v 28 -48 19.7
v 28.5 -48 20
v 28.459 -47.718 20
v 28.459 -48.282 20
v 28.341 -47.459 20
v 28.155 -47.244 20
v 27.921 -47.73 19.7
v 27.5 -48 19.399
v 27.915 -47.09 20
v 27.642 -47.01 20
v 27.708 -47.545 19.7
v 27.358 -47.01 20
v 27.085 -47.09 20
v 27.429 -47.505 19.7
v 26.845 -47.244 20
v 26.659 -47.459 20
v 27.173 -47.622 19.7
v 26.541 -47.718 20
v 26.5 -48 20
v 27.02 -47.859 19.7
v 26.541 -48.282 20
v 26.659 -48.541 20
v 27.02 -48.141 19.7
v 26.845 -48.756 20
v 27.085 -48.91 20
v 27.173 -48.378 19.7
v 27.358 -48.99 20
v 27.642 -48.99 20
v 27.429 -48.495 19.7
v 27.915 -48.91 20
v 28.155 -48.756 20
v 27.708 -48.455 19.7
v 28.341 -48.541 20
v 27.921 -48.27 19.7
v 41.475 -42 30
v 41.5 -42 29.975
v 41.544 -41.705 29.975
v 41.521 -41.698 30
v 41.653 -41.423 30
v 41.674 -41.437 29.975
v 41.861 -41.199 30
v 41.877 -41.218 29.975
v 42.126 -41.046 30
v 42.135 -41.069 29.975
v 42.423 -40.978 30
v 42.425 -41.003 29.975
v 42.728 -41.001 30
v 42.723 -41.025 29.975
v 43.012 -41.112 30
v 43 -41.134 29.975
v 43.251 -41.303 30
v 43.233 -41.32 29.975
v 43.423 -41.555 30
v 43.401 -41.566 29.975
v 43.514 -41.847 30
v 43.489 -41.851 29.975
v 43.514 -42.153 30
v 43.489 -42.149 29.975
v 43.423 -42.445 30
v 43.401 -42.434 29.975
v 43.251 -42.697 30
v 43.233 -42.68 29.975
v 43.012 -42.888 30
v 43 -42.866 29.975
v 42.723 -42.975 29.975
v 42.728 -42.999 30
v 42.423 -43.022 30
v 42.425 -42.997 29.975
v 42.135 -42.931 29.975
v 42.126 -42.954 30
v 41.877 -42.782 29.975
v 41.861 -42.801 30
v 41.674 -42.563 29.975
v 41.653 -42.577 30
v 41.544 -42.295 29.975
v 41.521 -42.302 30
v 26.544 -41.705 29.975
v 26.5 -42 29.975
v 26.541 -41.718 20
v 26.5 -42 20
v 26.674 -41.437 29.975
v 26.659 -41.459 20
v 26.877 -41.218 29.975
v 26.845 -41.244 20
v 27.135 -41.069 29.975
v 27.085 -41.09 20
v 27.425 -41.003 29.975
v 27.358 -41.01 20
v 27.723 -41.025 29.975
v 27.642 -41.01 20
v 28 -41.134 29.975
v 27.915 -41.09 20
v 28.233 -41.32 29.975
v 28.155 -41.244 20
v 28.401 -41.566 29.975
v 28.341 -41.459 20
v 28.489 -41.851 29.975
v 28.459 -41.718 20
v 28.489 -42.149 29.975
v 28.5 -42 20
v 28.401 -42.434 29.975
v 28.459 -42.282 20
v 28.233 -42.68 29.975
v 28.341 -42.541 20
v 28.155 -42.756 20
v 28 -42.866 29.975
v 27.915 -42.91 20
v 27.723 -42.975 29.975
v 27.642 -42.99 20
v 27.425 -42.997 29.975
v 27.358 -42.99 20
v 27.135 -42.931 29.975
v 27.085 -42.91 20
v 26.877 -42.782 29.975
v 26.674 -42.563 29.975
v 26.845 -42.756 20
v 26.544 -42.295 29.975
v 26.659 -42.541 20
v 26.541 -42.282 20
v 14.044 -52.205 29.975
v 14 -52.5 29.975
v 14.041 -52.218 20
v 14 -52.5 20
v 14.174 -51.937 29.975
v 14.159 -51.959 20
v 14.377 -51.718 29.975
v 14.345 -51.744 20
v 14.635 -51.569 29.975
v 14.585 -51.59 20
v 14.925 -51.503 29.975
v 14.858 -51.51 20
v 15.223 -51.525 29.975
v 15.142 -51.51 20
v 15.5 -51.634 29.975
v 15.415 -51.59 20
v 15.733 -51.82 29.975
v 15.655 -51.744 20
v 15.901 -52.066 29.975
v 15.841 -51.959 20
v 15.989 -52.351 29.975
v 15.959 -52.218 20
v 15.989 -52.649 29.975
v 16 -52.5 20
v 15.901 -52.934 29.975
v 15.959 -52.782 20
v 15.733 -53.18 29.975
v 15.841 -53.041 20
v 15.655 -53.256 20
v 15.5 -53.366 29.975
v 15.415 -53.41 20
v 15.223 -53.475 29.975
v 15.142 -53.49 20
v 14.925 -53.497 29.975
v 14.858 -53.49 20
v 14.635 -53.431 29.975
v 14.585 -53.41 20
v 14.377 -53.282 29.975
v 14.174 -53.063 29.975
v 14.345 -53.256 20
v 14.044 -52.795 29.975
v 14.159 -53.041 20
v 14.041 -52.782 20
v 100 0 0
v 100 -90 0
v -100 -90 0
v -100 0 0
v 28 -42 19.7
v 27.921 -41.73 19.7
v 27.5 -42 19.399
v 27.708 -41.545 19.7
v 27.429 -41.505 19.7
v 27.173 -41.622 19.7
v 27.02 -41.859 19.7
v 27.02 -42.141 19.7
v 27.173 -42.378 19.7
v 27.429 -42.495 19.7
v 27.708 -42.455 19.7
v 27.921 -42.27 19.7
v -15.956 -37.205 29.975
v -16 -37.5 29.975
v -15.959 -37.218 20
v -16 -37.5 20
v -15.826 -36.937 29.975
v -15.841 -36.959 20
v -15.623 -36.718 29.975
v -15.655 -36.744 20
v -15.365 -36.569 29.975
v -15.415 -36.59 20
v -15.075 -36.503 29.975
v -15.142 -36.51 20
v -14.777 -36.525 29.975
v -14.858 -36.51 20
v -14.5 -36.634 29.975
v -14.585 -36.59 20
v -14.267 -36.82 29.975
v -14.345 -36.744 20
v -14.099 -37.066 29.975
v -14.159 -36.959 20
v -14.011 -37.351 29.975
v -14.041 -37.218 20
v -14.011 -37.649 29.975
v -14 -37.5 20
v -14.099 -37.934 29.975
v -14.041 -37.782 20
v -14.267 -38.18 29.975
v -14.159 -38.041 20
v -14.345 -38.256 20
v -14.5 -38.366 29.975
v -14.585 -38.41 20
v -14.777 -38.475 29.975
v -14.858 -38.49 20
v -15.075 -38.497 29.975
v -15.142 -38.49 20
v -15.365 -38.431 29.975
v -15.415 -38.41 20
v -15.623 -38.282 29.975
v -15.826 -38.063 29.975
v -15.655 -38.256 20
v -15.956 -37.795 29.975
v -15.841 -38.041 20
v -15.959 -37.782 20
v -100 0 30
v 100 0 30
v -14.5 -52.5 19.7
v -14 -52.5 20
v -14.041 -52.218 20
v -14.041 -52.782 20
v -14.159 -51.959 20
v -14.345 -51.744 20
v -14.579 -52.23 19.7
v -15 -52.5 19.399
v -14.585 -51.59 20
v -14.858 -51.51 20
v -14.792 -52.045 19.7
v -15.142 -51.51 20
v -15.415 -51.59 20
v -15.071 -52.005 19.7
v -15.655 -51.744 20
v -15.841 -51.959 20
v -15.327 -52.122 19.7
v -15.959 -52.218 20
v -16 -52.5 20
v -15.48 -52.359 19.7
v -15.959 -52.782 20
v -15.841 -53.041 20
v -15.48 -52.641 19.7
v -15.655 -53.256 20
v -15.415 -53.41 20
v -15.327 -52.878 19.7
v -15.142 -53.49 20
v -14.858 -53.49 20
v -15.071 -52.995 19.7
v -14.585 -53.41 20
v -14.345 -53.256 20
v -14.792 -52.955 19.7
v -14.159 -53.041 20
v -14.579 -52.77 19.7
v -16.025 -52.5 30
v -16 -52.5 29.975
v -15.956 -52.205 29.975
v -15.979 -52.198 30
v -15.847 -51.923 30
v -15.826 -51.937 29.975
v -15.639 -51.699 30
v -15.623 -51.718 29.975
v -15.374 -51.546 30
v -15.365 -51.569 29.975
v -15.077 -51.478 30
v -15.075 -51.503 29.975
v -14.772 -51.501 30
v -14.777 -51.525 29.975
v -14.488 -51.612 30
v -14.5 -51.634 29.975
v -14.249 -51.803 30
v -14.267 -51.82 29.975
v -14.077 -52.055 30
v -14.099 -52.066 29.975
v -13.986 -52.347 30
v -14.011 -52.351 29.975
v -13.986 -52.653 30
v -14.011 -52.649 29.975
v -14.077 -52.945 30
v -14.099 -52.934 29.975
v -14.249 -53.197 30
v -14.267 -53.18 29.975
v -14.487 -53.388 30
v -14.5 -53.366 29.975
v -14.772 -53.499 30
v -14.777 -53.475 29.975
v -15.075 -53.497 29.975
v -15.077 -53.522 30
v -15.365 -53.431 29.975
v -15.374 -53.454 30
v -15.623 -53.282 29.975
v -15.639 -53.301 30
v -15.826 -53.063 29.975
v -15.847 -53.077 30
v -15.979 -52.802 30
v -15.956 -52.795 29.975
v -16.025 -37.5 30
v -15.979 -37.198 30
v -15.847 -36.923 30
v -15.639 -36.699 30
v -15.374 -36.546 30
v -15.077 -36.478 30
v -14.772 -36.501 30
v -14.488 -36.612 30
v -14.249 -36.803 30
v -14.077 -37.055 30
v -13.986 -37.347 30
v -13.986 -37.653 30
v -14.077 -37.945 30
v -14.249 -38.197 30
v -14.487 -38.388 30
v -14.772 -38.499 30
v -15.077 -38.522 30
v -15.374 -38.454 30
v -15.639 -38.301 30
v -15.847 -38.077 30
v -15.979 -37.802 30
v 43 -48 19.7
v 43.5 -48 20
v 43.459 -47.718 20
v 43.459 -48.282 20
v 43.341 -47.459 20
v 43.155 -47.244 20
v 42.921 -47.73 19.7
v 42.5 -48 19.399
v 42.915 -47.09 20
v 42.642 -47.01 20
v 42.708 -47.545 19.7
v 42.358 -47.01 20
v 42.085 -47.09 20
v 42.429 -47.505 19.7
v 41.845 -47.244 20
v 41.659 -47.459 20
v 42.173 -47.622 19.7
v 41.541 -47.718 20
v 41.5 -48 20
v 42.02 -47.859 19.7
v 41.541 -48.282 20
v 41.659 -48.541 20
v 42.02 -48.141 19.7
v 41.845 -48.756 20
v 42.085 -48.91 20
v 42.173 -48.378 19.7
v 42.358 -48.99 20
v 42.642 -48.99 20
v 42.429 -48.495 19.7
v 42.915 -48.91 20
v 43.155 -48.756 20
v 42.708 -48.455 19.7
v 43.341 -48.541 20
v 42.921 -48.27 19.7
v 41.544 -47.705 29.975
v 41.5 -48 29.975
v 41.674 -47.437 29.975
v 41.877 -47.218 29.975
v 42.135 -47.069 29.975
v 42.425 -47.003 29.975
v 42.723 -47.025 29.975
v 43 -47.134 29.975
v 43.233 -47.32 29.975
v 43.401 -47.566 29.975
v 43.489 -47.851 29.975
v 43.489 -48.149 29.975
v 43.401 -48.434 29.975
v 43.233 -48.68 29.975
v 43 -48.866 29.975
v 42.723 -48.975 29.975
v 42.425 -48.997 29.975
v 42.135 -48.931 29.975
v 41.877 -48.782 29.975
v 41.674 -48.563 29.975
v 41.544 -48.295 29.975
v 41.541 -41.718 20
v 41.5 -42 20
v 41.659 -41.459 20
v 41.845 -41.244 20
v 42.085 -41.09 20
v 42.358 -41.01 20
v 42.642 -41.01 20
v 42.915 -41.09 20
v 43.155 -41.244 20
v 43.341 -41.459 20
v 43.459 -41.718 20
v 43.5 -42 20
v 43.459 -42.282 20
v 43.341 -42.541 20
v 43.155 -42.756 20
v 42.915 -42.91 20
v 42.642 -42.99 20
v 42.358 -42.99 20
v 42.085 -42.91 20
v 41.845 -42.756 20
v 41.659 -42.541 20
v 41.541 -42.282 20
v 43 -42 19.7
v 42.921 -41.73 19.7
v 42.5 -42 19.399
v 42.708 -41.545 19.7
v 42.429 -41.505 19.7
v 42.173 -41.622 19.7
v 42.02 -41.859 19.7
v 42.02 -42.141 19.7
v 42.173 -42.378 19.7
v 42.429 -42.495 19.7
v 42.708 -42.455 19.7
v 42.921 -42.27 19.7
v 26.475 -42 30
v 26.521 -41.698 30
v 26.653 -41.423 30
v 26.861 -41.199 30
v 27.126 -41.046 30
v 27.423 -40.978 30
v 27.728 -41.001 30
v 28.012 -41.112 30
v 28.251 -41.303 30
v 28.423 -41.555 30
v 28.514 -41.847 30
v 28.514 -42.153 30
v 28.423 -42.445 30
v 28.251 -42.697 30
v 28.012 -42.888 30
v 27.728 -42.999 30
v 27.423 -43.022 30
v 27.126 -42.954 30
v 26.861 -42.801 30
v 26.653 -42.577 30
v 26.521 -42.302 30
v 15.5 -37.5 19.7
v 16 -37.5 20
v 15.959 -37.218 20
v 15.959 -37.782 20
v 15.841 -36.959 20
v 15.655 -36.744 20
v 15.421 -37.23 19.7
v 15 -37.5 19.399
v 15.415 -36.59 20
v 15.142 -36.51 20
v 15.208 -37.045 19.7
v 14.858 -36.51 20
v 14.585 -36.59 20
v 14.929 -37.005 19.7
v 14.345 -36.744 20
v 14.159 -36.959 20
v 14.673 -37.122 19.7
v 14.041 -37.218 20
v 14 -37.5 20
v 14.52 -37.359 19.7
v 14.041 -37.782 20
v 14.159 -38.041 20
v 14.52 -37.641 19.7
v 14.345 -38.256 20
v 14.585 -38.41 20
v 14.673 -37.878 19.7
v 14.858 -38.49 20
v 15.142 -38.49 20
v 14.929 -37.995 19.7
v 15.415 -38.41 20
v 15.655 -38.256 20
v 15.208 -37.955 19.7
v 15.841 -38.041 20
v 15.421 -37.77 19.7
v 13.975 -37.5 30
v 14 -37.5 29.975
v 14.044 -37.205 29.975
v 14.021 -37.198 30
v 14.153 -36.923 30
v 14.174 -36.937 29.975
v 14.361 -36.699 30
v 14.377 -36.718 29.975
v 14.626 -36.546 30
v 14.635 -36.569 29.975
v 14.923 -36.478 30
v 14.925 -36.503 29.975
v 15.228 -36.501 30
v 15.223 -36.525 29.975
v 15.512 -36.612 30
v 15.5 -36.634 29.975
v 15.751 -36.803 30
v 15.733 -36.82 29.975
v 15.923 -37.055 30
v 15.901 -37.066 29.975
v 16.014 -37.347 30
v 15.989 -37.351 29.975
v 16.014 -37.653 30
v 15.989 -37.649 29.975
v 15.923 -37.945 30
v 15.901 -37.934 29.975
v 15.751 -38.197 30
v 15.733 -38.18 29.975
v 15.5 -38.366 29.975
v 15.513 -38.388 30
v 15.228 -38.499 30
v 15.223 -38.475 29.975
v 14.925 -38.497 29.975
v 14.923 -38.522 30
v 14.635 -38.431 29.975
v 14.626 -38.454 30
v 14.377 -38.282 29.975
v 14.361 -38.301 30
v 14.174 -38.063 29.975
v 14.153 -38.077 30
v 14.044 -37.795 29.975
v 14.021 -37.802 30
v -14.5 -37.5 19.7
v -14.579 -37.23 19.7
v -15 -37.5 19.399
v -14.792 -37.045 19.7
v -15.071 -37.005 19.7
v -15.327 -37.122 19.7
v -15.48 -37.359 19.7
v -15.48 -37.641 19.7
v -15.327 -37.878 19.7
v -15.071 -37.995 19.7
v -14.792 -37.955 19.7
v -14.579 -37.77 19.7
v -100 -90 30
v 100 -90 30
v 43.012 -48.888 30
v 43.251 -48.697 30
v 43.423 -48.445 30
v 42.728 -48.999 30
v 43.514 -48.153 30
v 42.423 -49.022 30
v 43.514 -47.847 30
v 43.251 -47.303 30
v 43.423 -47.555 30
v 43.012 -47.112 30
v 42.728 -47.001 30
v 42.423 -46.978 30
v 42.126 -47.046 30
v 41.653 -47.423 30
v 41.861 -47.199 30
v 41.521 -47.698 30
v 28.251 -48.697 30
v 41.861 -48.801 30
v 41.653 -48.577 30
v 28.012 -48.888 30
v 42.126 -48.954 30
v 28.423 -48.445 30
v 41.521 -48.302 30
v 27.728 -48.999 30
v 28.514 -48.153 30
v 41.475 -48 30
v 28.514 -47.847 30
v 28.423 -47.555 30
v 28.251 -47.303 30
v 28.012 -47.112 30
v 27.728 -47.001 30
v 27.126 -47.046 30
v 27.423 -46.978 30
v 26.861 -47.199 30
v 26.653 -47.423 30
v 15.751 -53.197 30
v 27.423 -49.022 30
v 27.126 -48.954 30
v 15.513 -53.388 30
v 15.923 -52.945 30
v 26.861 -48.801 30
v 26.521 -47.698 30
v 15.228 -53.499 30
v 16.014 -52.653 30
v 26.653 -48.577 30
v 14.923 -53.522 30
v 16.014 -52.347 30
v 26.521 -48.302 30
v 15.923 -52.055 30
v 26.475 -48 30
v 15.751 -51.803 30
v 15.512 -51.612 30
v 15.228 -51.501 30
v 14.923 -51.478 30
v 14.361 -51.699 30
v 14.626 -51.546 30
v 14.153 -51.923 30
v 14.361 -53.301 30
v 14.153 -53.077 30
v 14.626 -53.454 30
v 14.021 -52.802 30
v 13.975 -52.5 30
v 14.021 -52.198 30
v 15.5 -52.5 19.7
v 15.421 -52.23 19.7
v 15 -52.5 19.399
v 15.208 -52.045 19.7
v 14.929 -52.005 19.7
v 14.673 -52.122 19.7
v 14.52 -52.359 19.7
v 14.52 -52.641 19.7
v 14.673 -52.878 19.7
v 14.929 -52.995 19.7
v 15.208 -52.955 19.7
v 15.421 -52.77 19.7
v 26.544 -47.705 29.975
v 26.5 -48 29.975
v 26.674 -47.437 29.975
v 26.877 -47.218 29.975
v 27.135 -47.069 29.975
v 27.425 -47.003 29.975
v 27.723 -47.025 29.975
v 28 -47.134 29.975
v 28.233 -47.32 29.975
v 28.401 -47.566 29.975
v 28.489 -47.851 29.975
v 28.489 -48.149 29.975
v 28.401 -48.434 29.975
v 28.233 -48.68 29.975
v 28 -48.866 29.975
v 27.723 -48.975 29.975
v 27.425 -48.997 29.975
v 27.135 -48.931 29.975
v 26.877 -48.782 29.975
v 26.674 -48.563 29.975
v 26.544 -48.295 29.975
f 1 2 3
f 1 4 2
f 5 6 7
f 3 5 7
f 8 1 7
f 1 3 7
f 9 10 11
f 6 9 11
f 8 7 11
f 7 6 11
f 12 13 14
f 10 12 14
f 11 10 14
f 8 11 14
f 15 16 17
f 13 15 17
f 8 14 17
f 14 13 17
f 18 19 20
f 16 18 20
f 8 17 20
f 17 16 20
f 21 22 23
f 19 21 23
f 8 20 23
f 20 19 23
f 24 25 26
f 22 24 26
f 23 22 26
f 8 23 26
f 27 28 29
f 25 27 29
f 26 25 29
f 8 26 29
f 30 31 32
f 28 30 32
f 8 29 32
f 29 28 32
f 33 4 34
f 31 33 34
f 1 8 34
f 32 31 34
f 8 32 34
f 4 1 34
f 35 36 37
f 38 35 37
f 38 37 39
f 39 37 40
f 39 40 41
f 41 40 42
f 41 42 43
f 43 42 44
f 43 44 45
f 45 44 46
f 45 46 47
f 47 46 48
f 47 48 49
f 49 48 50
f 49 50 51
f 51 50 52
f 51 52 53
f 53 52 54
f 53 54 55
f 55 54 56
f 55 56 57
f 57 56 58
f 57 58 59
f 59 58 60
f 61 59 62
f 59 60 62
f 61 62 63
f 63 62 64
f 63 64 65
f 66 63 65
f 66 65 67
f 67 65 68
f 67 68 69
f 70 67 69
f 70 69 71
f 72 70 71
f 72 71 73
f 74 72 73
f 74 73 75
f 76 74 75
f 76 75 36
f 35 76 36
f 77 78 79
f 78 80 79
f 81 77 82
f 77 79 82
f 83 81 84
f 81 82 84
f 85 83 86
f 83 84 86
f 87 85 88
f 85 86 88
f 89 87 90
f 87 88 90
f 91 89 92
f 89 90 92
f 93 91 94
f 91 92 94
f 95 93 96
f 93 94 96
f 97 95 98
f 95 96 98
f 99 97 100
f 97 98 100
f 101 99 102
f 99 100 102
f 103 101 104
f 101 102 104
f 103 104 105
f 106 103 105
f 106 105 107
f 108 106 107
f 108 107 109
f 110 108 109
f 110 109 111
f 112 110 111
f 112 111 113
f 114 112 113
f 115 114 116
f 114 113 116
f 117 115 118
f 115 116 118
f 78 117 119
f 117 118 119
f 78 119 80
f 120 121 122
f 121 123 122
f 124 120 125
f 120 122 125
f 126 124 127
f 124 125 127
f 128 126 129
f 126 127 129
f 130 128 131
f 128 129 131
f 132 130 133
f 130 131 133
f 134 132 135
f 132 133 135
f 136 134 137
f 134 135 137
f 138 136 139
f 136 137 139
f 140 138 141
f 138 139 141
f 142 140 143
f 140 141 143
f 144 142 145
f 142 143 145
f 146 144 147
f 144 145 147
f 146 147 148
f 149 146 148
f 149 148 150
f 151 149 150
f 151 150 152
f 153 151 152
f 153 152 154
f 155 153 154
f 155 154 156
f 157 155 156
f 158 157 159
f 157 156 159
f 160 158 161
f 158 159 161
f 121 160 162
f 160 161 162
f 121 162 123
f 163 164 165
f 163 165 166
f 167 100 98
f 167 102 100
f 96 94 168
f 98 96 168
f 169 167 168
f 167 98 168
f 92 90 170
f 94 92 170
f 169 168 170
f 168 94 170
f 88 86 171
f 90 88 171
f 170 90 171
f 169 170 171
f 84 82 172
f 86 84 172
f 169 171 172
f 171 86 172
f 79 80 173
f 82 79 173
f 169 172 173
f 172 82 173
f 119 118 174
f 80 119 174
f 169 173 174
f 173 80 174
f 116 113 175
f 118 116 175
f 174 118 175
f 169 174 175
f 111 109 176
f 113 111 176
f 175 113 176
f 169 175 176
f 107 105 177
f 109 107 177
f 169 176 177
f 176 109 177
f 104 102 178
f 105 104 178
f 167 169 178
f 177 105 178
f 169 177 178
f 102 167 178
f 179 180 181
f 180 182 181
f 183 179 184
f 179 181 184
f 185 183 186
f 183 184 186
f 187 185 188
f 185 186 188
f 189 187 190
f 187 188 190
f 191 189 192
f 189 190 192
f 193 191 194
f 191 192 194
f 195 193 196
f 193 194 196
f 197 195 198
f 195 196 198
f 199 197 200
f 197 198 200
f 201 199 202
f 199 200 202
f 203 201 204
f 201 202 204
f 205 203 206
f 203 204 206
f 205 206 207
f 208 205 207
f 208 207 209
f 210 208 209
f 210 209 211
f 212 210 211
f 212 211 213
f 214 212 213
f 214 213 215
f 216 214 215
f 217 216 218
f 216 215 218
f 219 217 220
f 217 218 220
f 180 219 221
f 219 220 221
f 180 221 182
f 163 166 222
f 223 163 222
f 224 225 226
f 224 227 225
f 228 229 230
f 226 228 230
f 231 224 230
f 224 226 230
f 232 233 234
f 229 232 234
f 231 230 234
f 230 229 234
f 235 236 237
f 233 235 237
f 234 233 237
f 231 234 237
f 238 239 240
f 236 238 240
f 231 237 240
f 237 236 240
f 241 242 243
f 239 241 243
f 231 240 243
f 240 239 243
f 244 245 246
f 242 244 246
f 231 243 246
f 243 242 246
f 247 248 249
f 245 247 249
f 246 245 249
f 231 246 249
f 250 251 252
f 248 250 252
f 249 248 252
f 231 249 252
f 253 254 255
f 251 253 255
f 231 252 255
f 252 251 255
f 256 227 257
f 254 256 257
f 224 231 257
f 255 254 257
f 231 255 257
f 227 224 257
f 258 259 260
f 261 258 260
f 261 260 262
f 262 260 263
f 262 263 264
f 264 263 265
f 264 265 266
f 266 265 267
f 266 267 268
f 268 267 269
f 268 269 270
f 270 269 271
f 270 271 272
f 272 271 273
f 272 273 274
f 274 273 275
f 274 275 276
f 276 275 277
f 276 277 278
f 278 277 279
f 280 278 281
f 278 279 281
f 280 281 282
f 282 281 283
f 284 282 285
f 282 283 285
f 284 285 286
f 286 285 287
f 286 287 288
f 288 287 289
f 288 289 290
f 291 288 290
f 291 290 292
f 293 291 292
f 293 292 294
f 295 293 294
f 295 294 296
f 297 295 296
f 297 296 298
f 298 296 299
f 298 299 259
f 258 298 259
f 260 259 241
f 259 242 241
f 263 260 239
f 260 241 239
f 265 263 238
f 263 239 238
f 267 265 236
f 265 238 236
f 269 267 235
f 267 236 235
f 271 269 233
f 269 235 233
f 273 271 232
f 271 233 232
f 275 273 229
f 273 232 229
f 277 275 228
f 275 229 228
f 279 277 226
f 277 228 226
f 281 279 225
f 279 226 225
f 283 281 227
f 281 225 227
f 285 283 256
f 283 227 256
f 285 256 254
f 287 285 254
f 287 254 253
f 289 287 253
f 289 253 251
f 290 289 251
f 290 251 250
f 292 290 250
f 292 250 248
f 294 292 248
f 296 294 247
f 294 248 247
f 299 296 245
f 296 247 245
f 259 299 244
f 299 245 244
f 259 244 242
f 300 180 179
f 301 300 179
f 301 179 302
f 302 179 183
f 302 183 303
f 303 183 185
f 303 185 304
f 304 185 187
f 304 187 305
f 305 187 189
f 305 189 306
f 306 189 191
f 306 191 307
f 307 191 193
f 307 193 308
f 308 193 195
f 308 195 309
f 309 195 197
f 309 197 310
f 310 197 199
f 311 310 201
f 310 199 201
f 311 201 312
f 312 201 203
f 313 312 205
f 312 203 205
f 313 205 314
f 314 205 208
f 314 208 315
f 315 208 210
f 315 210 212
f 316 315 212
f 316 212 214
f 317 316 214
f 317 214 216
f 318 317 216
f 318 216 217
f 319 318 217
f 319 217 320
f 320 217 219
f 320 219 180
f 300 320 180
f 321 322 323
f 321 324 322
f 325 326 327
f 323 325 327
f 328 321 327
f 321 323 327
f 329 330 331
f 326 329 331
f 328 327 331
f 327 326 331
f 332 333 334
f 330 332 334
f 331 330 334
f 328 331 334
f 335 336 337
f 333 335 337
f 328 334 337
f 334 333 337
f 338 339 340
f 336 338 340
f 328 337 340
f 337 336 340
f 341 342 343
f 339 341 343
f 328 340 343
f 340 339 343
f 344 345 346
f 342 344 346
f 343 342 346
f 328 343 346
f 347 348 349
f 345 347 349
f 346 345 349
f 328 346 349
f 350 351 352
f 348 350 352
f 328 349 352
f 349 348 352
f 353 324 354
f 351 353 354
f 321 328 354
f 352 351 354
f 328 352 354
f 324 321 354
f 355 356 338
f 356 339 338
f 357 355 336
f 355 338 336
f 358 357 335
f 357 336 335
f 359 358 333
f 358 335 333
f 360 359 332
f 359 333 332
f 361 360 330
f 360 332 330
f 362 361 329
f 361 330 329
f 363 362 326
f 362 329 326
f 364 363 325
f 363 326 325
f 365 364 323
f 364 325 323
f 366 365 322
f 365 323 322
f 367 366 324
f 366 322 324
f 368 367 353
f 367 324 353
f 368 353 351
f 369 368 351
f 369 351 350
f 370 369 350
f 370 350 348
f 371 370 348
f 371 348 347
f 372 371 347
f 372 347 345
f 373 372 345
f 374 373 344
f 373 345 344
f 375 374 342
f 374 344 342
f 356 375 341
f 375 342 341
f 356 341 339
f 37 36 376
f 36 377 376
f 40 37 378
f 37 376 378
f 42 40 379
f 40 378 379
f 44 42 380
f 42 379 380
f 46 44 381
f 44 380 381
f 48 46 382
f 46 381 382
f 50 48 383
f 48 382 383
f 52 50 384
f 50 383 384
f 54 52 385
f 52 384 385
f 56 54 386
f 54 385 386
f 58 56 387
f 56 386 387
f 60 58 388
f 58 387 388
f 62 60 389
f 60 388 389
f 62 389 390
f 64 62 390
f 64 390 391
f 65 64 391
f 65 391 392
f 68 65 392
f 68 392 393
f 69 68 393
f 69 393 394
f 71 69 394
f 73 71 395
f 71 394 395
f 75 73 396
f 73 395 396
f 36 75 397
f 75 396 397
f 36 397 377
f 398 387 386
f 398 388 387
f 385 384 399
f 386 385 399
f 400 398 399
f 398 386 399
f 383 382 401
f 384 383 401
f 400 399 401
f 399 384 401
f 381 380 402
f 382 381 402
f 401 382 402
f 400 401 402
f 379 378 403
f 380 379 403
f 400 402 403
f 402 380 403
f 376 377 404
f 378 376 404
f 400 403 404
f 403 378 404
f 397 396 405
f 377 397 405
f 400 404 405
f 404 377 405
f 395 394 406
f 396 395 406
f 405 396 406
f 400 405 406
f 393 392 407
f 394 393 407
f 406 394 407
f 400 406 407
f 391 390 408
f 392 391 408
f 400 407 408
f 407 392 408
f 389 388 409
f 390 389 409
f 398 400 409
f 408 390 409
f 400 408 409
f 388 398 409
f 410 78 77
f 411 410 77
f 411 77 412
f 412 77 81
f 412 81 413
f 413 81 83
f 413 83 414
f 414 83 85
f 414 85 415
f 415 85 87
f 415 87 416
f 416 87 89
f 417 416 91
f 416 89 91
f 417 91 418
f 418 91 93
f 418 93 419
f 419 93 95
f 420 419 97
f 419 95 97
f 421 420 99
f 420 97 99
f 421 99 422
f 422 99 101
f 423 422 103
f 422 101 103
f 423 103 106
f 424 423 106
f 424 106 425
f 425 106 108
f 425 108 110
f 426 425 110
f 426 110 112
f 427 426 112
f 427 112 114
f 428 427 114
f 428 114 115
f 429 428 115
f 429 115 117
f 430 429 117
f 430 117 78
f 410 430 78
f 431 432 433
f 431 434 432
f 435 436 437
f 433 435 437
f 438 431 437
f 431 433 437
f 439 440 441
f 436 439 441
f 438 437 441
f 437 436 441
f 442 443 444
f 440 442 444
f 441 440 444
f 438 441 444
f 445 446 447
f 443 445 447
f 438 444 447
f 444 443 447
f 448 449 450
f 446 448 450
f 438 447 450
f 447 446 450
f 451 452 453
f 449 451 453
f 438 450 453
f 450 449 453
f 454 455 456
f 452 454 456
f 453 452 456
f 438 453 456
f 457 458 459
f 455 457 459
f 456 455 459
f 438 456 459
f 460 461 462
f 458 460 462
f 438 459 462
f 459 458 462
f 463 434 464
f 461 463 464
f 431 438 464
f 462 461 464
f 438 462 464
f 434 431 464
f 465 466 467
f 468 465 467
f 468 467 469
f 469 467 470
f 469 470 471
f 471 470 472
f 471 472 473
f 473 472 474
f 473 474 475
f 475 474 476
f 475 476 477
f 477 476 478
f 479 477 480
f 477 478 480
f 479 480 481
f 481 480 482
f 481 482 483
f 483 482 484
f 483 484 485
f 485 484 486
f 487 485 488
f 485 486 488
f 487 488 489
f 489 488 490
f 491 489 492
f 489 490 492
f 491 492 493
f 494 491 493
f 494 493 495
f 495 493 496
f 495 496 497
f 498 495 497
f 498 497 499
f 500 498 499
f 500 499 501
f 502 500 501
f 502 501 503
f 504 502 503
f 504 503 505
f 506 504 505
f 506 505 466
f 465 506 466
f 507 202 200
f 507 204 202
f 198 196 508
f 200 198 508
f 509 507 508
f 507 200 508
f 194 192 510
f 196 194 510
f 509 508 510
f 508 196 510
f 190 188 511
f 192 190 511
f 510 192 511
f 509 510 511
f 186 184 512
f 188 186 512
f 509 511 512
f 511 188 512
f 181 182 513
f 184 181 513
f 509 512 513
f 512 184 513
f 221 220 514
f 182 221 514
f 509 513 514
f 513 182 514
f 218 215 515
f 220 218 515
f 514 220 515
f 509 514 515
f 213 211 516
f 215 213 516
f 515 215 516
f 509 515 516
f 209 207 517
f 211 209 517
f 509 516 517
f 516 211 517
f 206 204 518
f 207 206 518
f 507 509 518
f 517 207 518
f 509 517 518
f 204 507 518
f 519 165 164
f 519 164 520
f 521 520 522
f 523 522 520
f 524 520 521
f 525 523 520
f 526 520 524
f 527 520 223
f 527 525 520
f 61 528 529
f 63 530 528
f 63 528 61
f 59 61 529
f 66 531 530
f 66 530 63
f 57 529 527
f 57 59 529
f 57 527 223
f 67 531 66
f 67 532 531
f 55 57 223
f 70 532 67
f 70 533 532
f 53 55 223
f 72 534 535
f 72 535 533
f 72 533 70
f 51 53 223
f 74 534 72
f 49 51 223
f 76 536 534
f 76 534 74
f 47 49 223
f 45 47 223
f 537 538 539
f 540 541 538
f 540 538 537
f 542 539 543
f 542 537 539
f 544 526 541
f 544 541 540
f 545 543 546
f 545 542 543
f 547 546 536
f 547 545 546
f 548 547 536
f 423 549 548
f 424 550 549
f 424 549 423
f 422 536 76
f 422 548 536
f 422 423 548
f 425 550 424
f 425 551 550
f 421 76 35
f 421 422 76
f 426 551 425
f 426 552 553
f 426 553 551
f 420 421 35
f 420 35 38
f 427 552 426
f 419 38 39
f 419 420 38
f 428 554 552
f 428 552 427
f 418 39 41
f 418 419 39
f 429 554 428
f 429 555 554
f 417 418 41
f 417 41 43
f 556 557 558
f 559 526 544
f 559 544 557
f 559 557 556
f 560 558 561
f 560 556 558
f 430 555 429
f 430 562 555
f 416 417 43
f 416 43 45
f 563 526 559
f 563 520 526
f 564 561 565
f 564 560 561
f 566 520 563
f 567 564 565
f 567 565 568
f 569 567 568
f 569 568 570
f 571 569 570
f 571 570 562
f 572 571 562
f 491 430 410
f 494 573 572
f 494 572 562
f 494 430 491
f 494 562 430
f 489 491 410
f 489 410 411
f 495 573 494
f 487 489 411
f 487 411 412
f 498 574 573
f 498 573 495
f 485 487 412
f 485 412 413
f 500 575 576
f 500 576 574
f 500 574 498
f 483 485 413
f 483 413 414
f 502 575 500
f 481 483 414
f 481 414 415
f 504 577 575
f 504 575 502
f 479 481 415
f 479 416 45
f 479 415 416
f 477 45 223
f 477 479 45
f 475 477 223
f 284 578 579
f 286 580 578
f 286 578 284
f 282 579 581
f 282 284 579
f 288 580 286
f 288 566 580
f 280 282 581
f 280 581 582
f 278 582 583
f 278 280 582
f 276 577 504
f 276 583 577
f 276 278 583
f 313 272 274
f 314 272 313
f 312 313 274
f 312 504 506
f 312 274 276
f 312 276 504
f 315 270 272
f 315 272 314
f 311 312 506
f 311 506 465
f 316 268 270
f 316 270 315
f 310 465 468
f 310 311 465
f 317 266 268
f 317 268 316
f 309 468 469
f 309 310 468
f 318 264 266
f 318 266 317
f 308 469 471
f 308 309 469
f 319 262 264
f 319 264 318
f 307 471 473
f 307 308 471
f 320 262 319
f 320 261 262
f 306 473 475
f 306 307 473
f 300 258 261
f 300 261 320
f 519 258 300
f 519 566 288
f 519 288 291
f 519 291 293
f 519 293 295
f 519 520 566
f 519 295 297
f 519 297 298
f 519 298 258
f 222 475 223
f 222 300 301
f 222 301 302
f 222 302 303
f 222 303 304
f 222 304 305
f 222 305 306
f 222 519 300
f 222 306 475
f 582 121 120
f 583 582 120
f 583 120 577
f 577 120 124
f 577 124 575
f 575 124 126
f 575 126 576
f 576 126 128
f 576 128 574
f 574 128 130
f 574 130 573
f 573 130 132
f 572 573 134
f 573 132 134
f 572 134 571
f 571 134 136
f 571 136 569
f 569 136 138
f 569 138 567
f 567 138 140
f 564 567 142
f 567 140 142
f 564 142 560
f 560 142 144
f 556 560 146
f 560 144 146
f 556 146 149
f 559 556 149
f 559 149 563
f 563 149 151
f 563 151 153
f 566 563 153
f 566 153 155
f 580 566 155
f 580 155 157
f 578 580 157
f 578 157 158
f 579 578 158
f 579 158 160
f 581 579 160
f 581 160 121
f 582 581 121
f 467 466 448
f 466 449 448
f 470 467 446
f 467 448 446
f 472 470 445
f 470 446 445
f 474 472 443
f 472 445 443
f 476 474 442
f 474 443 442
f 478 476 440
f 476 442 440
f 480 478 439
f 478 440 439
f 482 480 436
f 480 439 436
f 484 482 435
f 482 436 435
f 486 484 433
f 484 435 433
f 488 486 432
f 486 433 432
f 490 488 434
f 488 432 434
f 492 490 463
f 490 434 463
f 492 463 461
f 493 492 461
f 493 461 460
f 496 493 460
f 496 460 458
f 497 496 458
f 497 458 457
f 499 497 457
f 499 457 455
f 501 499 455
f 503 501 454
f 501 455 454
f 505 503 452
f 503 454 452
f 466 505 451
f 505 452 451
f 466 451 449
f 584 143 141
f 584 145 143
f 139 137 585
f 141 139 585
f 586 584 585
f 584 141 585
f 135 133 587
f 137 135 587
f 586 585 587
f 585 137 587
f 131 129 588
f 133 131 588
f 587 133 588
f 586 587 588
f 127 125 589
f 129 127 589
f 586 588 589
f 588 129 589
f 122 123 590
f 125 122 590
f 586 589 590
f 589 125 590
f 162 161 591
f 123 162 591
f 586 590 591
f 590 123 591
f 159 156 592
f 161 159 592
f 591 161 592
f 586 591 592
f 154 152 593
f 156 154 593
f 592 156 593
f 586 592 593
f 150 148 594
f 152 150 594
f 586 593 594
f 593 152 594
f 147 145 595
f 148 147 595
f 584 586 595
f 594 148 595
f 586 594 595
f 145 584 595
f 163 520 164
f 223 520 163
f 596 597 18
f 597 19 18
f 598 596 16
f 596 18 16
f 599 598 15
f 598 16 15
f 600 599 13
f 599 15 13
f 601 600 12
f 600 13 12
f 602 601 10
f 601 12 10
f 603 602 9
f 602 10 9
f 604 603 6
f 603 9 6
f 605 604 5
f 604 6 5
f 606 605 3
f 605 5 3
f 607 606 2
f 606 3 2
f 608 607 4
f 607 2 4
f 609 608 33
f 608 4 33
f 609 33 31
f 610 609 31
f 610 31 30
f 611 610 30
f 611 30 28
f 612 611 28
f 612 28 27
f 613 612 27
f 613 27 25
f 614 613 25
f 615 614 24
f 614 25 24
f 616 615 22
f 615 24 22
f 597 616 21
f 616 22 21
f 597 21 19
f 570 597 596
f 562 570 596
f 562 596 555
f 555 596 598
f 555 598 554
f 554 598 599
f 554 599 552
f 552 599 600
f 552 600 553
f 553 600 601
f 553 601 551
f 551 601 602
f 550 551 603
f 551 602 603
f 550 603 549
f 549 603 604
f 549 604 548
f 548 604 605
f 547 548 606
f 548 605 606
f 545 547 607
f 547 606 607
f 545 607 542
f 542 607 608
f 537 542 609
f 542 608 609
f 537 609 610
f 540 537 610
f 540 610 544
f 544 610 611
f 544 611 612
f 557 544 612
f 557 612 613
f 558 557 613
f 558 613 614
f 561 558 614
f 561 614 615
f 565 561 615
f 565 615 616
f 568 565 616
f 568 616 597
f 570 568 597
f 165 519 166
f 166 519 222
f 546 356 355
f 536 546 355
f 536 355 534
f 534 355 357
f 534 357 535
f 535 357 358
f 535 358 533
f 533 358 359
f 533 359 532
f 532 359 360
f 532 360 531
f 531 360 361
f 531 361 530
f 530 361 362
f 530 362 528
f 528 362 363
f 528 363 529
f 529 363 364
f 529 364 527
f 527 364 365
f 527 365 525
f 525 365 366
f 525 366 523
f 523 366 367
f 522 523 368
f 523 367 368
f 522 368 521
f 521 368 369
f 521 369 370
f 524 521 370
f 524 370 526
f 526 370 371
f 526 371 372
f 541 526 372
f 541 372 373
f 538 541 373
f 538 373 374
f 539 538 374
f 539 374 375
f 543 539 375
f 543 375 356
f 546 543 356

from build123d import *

# Parameters (mm, degrees)
BOSS_EXTRUDE2_DEPTH             = 100
BOSS_EXTRUDE2_DEPTH_BACK        = 100
SKETCH1_W                       = 90
SKETCH1_H                       = 30
F_2_0MM_DOWEL_HOLE1_D           = 2
F_2_0MM_DOWEL_HOLE1_DEPTH       = 10
F_2_0MM_DOWEL_HOLE1_CSINK_D     = 2.05
F_2_0MM_DOWEL_HOLE1_CSINK_ANGLE = 90
F_2_0MM_DOWEL_HOLE1_TIP         = 0.600860619
F_2_0MM_DOWEL_HOLE2_D           = 2
F_2_0MM_DOWEL_HOLE2_DEPTH       = 10
F_2_0MM_DOWEL_HOLE2_CSINK_D     = 2.05
F_2_0MM_DOWEL_HOLE2_CSINK_ANGLE = 90
F_2_0MM_DOWEL_HOLE2_TIP         = 0.600860619


with BuildPart() as part:
    # Sketch1 → Boss-Extrude2 (new, two sides: drawn at the far end of the back side and taken through both)
    with BuildSketch(Plane.YZ.offset(-BOSS_EXTRUDE2_DEPTH_BACK)):
        with Locations((-45, 15)):
            Rectangle(SKETCH1_W, SKETCH1_H)
    extrude(amount=BOSS_EXTRUDE2_DEPTH + BOSS_EXTRUDE2_DEPTH_BACK)

    # Ø2.0mm Dowel Hole1
    with Locations(Plane.XY.offset(30)):
        with Locations((15, -52.5), (-15, -37.5), (-15, -52.5), (15, -37.5)):
            CounterSinkHole(F_2_0MM_DOWEL_HOLE1_D / 2, F_2_0MM_DOWEL_HOLE1_CSINK_D / 2, depth=F_2_0MM_DOWEL_HOLE1_DEPTH, counter_sink_angle=F_2_0MM_DOWEL_HOLE1_CSINK_ANGLE)
            with Locations((0, 0, -(F_2_0MM_DOWEL_HOLE1_DEPTH + F_2_0MM_DOWEL_HOLE1_TIP / 2))):  # 118° drill point
                Cone(0, F_2_0MM_DOWEL_HOLE1_D / 2, F_2_0MM_DOWEL_HOLE1_TIP, mode=Mode.SUBTRACT)

    # Ø2.0mm Dowel Hole2
    with Locations(Plane.XY.offset(30)):
        with Locations((42.5, -42), (27.5, -42), (27.5, -48), (42.5, -48)):
            CounterSinkHole(F_2_0MM_DOWEL_HOLE2_D / 2, F_2_0MM_DOWEL_HOLE2_CSINK_D / 2, depth=F_2_0MM_DOWEL_HOLE2_DEPTH, counter_sink_angle=F_2_0MM_DOWEL_HOLE2_CSINK_ANGLE)
            with Locations((0, 0, -(F_2_0MM_DOWEL_HOLE2_DEPTH + F_2_0MM_DOWEL_HOLE2_TIP / 2))):  # 118° drill point
                Cone(0, F_2_0MM_DOWEL_HOLE2_D / 2, F_2_0MM_DOWEL_HOLE2_TIP, mode=Mode.SUBTRACT)


solid = part.part
